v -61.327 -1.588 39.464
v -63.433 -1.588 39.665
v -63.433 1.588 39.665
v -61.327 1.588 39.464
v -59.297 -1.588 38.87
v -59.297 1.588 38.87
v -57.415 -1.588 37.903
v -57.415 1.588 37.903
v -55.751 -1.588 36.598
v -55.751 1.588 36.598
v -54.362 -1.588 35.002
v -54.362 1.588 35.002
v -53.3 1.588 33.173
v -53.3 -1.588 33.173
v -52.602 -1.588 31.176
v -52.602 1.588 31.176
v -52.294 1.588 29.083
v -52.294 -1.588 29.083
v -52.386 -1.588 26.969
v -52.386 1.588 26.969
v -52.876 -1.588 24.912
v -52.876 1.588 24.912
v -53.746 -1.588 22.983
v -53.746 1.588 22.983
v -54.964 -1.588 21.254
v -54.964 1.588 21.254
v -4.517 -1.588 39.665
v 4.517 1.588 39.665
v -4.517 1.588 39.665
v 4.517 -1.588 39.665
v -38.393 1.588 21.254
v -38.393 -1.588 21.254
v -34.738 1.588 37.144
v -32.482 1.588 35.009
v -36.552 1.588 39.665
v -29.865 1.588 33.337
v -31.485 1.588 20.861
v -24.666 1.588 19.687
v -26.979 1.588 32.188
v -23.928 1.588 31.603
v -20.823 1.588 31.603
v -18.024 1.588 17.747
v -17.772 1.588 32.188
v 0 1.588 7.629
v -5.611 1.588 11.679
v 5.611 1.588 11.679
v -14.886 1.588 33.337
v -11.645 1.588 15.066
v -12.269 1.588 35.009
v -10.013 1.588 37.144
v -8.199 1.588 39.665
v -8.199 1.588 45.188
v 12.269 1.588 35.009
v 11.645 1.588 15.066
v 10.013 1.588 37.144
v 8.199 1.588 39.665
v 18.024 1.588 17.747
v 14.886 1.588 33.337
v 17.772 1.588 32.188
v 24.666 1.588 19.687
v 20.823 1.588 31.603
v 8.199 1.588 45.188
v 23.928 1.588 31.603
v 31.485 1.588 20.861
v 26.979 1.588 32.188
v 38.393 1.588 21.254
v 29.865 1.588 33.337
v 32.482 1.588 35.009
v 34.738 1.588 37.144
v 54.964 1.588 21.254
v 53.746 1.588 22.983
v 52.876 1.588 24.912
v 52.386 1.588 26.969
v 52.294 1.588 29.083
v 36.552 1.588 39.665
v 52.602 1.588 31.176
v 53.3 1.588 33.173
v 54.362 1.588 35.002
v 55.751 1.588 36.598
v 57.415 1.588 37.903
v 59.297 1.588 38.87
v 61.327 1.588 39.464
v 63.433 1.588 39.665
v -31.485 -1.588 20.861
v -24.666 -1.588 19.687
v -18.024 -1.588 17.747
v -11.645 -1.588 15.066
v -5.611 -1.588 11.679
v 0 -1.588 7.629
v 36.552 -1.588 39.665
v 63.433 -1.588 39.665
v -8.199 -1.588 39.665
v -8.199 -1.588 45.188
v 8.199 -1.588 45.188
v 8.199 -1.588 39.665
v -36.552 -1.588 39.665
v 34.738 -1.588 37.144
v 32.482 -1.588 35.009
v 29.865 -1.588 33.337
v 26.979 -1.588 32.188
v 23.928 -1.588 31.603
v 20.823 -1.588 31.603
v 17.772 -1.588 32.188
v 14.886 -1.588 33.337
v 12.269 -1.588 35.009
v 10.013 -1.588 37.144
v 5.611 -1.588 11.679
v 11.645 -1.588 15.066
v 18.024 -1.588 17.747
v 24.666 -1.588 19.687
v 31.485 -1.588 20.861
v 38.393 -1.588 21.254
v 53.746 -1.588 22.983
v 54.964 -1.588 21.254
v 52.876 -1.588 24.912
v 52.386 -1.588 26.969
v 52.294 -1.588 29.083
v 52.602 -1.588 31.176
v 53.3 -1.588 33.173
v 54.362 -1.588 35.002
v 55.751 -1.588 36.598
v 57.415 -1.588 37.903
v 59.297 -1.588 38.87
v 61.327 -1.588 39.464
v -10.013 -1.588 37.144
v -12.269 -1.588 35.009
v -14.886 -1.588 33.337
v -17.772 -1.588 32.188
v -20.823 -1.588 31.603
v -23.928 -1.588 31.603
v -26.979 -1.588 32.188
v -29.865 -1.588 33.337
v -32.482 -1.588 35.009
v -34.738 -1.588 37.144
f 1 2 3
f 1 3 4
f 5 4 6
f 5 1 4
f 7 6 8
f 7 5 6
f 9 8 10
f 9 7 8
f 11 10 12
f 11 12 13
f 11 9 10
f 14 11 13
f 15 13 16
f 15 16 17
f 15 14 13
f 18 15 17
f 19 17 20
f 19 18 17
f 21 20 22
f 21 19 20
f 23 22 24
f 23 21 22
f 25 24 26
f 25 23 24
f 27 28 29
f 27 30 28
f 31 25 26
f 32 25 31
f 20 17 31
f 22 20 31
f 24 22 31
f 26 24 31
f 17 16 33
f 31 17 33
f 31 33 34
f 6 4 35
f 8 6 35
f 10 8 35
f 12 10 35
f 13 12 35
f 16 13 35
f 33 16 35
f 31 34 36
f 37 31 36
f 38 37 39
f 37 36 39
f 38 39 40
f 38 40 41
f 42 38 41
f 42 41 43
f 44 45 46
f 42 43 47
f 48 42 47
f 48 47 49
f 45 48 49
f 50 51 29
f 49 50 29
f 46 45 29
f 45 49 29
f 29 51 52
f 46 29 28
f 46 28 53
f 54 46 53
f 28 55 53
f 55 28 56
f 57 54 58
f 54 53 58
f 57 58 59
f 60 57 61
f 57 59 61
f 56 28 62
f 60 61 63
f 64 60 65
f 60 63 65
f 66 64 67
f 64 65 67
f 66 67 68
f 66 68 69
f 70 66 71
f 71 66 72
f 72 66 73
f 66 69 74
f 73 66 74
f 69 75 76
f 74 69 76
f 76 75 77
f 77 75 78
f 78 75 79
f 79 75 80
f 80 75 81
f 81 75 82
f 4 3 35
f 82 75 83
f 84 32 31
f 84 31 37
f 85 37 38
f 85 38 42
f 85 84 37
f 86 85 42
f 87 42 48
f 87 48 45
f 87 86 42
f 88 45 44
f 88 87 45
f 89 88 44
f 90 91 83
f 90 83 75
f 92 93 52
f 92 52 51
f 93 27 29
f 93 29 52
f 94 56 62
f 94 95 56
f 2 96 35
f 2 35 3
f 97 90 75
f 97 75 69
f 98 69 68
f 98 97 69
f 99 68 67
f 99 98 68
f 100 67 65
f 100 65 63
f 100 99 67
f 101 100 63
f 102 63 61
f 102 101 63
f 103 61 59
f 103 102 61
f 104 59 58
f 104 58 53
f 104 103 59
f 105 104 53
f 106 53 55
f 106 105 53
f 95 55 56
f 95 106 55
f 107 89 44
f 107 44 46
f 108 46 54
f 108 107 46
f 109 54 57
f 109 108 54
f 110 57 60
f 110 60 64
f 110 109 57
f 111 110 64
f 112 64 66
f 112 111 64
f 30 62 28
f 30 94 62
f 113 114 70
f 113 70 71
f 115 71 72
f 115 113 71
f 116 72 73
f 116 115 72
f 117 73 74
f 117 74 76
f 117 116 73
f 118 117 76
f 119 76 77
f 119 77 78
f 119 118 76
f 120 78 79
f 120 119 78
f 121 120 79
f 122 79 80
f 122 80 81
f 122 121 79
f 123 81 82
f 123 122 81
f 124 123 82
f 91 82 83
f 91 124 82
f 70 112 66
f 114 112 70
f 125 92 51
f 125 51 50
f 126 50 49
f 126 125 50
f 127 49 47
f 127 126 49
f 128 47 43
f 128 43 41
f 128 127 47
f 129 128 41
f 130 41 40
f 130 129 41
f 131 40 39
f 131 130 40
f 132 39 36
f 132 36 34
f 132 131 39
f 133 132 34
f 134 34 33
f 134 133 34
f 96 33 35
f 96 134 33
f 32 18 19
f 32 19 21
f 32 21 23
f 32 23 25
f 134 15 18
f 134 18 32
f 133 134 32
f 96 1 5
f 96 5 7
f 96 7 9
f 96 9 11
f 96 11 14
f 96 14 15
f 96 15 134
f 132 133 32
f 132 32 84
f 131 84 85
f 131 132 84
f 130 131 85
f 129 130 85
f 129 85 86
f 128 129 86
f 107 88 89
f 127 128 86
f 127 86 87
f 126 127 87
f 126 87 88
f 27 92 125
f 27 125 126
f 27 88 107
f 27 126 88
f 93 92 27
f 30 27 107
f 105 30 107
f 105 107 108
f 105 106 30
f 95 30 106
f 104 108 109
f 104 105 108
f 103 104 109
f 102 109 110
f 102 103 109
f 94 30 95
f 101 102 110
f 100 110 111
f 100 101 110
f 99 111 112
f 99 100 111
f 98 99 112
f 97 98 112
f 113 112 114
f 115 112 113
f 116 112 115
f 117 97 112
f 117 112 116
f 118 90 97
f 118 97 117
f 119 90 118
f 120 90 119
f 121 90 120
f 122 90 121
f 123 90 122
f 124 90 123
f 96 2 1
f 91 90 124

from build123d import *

# Parameters (mm, degrees)
F1_DEPTH = 1.5875


with BuildPart() as f1:
    # F0 (on Front) → F1 (new body, symmetric)
    with BuildSketch(Plane.XZ):
        with BuildLine():
            Line((4.516544, 39.664961), (0, 39.664961))
            Line((0, 39.664961), (-4.516544, 39.664961))
            Line((-4.516544, 39.664961), (-8.198804, 45.188352))
            Line((-8.198804, 45.188352), (-8.198804, 39.664961))
            ThreePointArc((-8.198804, 39.664961), (-22.375505, 31.529893), (-36.552206, 39.664961))
            Line((-36.552206, 39.664961), (-63.432701, 39.664961))
            ThreePointArc((-63.432701, 39.664961), (-53.299794, 33.172534), (-54.963503, 21.253662))
            Line((-54.963503, 21.253662), (-38.393334, 21.253662))
            ThreePointArc((-38.393334, 21.253662), (-18.023802, 17.746605), (0, 7.629301))
            ThreePointArc((0, 7.629301), (18.023802, 17.746605), (38.393334, 21.253662))
            Line((38.393334, 21.253662), (54.963503, 21.253662))
            ThreePointArc((54.963503, 21.253662), (53.299794, 33.172534), (63.432701, 39.664961))
            Line((63.432701, 39.664961), (36.552206, 39.664961))
            ThreePointArc((36.552206, 39.664961), (22.375505, 31.529893), (8.198804, 39.664961))
            Line((8.198804, 39.664961), (8.198804, 45.188352))
            Line((8.198804, 45.188352), (4.516544, 39.664961))
        make_face()
    extrude(amount=F1_DEPTH, both=True)


solid = f1.part
